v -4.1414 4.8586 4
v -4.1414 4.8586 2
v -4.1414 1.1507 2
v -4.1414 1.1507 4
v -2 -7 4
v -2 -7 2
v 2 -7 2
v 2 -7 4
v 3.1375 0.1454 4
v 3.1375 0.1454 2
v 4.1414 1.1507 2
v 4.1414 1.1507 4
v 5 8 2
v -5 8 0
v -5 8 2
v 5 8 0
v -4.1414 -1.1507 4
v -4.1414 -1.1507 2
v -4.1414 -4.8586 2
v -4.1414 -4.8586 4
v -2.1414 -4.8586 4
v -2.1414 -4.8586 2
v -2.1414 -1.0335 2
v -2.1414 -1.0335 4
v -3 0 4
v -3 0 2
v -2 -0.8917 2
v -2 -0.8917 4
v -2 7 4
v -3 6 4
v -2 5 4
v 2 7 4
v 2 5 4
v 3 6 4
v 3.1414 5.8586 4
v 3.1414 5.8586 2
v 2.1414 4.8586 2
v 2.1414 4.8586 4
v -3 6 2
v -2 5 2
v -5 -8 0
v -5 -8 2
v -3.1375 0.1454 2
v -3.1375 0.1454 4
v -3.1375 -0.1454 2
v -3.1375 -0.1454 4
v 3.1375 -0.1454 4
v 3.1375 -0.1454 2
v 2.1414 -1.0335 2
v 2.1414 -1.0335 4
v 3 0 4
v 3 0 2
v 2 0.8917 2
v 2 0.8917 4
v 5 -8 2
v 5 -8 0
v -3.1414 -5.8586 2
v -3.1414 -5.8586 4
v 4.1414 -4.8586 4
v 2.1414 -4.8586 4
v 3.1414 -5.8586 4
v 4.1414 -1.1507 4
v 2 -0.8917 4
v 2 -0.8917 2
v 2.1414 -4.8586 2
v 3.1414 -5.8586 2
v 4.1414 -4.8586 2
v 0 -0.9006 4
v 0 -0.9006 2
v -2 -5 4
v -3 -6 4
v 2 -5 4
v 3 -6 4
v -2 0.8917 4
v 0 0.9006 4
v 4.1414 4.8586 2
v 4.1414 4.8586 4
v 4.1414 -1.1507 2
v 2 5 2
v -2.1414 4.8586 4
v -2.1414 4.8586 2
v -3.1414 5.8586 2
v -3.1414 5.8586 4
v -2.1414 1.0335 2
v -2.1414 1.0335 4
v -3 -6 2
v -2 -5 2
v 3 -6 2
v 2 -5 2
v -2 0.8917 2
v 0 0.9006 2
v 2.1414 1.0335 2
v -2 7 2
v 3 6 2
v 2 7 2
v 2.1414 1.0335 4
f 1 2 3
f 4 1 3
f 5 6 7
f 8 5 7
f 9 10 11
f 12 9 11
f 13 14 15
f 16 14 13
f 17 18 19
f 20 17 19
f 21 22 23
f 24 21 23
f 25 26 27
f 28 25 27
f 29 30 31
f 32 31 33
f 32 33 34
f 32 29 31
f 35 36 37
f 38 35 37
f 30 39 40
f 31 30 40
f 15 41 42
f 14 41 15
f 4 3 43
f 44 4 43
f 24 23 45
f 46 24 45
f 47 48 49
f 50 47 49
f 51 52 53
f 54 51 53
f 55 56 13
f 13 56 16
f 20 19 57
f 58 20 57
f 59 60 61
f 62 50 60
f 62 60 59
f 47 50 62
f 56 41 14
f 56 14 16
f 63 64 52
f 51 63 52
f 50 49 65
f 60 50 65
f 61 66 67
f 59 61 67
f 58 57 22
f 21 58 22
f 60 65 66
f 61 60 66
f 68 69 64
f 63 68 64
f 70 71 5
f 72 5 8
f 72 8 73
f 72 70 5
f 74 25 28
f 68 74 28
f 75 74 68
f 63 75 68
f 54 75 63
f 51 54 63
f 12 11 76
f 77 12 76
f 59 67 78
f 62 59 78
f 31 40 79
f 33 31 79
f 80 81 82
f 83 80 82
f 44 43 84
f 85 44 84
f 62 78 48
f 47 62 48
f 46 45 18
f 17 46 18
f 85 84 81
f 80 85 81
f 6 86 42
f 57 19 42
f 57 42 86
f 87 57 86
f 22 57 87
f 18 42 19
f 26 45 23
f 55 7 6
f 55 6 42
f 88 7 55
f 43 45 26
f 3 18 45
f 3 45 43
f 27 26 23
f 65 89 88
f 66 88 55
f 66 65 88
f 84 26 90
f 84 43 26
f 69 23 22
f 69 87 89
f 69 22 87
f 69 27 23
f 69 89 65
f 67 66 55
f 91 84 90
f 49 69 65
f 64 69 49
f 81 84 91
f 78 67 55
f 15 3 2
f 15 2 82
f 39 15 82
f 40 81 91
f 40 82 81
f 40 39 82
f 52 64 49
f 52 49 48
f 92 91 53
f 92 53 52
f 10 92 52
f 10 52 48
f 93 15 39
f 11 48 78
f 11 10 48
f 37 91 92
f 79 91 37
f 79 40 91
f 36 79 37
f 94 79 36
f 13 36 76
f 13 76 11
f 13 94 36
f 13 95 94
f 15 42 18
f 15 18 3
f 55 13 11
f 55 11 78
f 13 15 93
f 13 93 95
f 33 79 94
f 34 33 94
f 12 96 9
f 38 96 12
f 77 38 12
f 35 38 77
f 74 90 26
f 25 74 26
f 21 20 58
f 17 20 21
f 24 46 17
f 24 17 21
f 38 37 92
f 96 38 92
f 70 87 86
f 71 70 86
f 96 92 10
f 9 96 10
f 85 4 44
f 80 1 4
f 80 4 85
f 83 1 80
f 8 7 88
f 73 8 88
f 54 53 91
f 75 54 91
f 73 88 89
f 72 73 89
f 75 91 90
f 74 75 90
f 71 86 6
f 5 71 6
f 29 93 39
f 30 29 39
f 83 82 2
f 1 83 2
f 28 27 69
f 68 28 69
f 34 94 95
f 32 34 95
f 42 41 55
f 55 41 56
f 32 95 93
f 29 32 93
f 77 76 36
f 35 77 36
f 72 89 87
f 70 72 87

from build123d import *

# Parameters (mm, degrees)
F0_W     = 10
F0_H     = 16
F1_DEPTH = 2
F3_DEPTH = 2


# Not quite as in the source:
# - ends of sketch curves that miss each other by under 0.0002 mm in the source are joined


with BuildPart() as f1:
    # F0 (on Top) → F1 (new body)
    with BuildSketch(Plane.XY):
        Rectangle(F0_W, F0_H)
    extrude(amount=F1_DEPTH)

    # F2 (on face) → F3 (join)
    with BuildSketch(Plane.XY.offset(2)):
        Polygon((0, 7), (-2, 7), (-3, 6), (-2, 5), (0, 5), (2, 5), (3, 6), (2, 7), align=None)
        Polygon((-2.1414213562, 4.8585786438), (-3.1414213562, 5.8585786438), (-4.1414213562, 4.8585786438), (-4.1414213562, 1.1507223826), (-3.1374518146, 0.1453992321), (-2.1414213562, 1.0335195075), align=None)
        Polygon((2, 0.891659756), (2.00782e-05, 0.9006214721), (-2, 0.891659756), (-3, 0), (-2, -0.891659756), (-2.00782e-05, -0.9006214721), (2, -0.891659756), (3, 0), align=None)
        Polygon((0, -5), (-2, -5), (-3, -6), (-2, -7), (0, -7), (2, -7), (3, -6), (2, -5), align=None)
        Polygon((-4.1414213562, -4.8585786438), (-3.1414213562, -5.8585786438), (-2.1414213562, -4.8585786438), (-2.1414213562, -1.0335195075), (-3.1374518146, -0.1453992321), (-4.1414213562, -1.1507223826), align=None)
        Polygon((4.1414213562, 4.8585786438), (3.1414213562, 5.8585786438), (2.1414213562, 4.8585786438), (2.1414213562, 1.0335195075), (3.1374518146, 0.1453992321), (4.1414213562, 1.1507223826), align=None)
        Polygon((3.1374518146, -0.1453992321), (2.1414213562, -1.0335195075), (2.1414213562, -4.8585786438), (3.1414213562, -5.8585786438), (4.1414213562, -4.8585786438), (4.1414213562, -1.1507223826), align=None)
    extrude(amount=F3_DEPTH)


solid = f1.part
